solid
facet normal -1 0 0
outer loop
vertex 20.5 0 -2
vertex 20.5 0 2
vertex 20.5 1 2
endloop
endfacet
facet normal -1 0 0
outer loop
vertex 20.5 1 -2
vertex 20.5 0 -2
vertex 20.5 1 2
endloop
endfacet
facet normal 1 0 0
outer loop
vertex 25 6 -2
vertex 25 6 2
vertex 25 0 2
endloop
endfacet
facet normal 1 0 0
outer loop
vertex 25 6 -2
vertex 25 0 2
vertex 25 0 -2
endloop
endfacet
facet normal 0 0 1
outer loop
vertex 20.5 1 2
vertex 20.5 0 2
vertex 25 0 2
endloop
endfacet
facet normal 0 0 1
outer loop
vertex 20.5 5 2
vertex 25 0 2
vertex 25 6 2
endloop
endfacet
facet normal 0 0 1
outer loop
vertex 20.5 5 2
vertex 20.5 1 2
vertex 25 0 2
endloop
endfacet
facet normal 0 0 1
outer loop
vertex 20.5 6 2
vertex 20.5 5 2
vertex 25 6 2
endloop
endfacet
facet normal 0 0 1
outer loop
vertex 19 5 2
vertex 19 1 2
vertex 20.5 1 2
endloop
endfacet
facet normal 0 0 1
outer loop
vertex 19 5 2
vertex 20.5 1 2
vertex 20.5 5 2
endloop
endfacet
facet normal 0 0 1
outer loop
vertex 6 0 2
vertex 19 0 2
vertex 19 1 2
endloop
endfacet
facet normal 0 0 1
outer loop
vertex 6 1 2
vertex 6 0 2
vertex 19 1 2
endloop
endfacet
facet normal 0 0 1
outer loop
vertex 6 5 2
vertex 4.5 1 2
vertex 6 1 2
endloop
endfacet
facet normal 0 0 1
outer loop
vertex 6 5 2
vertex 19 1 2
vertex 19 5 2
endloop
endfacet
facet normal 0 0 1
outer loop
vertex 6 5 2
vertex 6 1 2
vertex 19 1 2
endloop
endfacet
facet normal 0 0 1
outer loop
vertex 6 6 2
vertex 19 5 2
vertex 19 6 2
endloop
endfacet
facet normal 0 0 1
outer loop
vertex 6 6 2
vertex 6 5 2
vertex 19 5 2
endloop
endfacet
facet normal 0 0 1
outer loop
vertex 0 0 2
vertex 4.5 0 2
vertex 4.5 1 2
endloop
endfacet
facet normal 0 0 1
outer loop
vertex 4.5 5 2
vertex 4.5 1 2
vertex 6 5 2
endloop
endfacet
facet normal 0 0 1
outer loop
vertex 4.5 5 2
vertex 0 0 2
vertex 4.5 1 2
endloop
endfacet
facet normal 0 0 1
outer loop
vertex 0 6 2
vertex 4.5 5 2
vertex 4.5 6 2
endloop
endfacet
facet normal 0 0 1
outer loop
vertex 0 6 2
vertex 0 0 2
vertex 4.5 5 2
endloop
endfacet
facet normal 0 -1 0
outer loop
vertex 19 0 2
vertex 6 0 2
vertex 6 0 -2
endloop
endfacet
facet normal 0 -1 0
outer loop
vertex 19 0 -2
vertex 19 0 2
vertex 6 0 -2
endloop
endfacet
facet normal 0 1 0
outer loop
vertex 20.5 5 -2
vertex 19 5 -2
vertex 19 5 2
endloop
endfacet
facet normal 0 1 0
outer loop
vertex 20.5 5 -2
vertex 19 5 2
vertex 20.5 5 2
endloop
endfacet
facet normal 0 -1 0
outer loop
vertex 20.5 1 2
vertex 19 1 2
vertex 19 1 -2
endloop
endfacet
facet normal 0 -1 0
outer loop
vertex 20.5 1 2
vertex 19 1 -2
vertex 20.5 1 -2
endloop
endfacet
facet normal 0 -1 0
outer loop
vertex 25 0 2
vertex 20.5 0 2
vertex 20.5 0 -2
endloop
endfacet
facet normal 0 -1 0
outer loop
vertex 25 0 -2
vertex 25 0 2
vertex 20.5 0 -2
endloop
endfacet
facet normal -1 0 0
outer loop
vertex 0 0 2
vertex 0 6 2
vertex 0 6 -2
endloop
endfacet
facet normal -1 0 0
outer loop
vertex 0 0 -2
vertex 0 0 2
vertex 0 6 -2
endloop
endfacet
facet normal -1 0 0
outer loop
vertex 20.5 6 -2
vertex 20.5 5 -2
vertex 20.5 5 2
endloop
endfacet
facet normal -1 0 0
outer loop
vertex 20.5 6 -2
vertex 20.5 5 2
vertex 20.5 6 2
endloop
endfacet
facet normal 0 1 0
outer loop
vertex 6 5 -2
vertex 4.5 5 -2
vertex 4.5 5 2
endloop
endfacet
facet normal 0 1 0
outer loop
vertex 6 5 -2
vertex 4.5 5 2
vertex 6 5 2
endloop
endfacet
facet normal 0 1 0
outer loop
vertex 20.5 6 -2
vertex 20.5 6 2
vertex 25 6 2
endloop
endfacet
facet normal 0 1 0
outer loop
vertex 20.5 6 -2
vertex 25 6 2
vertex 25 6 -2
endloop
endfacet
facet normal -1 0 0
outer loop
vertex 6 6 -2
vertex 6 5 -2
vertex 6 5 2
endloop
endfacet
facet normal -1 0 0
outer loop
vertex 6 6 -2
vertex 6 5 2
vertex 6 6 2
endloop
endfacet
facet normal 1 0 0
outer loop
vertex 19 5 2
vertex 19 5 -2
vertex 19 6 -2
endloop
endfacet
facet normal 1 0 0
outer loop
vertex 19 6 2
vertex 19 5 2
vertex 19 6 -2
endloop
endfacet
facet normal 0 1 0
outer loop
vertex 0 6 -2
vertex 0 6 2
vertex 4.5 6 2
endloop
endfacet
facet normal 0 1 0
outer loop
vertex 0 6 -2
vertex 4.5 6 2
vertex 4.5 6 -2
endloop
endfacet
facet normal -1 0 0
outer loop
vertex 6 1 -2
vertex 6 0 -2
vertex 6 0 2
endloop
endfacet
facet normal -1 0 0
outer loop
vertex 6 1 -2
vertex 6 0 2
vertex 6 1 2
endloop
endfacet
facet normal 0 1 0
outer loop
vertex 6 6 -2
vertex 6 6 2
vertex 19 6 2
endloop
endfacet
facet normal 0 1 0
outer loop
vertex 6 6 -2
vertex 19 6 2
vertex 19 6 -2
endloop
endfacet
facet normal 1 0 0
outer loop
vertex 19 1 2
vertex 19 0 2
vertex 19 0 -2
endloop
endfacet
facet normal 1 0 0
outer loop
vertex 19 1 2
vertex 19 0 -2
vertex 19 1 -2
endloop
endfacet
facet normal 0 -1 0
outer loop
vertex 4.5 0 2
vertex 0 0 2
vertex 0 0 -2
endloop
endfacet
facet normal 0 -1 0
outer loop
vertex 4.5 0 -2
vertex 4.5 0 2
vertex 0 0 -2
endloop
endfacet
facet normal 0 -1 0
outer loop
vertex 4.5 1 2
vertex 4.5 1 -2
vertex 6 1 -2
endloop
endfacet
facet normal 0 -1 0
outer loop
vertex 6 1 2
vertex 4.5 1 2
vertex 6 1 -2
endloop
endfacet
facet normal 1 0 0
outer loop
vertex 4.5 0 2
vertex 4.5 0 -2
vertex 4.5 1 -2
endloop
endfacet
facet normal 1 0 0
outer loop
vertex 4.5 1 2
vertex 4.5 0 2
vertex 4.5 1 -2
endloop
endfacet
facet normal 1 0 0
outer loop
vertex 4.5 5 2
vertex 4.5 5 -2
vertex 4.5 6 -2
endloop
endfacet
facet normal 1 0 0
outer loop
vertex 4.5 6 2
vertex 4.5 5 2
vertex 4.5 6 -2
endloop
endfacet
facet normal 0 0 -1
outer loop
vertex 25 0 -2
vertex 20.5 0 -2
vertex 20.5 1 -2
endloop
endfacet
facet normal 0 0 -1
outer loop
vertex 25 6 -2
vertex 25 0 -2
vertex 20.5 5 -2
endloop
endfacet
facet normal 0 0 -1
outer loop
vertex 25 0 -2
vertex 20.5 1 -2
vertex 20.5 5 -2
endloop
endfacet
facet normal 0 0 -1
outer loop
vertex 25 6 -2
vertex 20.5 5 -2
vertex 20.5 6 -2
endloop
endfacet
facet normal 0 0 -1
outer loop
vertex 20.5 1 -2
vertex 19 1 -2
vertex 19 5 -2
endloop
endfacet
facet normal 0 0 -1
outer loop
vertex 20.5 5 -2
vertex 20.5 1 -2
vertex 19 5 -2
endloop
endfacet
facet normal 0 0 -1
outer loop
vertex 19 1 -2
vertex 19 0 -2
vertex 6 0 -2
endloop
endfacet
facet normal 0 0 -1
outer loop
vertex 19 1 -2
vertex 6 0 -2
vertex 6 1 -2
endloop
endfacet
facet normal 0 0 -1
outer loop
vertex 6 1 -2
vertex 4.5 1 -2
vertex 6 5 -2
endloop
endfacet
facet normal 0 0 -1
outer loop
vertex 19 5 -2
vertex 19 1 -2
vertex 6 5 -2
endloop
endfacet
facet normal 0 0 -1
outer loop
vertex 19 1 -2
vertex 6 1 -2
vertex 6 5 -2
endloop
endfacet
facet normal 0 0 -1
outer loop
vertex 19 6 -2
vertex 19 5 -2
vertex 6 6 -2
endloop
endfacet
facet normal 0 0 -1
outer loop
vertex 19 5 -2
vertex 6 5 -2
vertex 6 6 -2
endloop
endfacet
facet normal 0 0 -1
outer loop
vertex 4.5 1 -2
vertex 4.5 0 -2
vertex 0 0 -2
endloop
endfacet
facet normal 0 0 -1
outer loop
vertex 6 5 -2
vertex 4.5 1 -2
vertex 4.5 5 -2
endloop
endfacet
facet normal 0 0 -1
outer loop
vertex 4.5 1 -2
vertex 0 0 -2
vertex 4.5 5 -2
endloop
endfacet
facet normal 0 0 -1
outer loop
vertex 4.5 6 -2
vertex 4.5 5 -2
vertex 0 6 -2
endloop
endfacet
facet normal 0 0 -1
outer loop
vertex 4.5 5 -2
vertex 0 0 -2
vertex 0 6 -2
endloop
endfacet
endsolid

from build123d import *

# Parameters (mm, degrees)
SKETCH_1_W          = 4
SKETCH_1_H          = 6
EXTRUDE_1_DEPTH     = 25
SKETCH_3_W          = 1.5
SKETCH_3_H          = 1
CUT_EXTRUDE_1_DEPTH = 10


with BuildPart() as part:
    # 草图1 → 凸台-拉伸1 (new body)
    with BuildSketch(Plane(origin=(0, 0, 0), x_dir=(0, 0, -1), z_dir=(1, 0, 0))):
        with Locations((0, 3)):
            Rectangle(SKETCH_1_W, SKETCH_1_H)
    extrude(amount=EXTRUDE_1_DEPTH)

    # 草图3 → 切除-拉伸1 (cut, symmetric)
    with BuildSketch(Plane.XY):
        with Locations((5.25, 0.5)):
            Rectangle(SKETCH_3_W, SKETCH_3_H)
        with Locations((5.25, 5.5)):
            Rectangle(SKETCH_3_W, SKETCH_3_H)
        with Locations((19.75, 5.5)):
            Rectangle(SKETCH_3_W, SKETCH_3_H)
        with Locations((19.75, 0.5)):
            Rectangle(SKETCH_3_W, SKETCH_3_H)
    extrude(amount=CUT_EXTRUDE_1_DEPTH, both=True, mode=Mode.SUBTRACT)


solid = part.part
